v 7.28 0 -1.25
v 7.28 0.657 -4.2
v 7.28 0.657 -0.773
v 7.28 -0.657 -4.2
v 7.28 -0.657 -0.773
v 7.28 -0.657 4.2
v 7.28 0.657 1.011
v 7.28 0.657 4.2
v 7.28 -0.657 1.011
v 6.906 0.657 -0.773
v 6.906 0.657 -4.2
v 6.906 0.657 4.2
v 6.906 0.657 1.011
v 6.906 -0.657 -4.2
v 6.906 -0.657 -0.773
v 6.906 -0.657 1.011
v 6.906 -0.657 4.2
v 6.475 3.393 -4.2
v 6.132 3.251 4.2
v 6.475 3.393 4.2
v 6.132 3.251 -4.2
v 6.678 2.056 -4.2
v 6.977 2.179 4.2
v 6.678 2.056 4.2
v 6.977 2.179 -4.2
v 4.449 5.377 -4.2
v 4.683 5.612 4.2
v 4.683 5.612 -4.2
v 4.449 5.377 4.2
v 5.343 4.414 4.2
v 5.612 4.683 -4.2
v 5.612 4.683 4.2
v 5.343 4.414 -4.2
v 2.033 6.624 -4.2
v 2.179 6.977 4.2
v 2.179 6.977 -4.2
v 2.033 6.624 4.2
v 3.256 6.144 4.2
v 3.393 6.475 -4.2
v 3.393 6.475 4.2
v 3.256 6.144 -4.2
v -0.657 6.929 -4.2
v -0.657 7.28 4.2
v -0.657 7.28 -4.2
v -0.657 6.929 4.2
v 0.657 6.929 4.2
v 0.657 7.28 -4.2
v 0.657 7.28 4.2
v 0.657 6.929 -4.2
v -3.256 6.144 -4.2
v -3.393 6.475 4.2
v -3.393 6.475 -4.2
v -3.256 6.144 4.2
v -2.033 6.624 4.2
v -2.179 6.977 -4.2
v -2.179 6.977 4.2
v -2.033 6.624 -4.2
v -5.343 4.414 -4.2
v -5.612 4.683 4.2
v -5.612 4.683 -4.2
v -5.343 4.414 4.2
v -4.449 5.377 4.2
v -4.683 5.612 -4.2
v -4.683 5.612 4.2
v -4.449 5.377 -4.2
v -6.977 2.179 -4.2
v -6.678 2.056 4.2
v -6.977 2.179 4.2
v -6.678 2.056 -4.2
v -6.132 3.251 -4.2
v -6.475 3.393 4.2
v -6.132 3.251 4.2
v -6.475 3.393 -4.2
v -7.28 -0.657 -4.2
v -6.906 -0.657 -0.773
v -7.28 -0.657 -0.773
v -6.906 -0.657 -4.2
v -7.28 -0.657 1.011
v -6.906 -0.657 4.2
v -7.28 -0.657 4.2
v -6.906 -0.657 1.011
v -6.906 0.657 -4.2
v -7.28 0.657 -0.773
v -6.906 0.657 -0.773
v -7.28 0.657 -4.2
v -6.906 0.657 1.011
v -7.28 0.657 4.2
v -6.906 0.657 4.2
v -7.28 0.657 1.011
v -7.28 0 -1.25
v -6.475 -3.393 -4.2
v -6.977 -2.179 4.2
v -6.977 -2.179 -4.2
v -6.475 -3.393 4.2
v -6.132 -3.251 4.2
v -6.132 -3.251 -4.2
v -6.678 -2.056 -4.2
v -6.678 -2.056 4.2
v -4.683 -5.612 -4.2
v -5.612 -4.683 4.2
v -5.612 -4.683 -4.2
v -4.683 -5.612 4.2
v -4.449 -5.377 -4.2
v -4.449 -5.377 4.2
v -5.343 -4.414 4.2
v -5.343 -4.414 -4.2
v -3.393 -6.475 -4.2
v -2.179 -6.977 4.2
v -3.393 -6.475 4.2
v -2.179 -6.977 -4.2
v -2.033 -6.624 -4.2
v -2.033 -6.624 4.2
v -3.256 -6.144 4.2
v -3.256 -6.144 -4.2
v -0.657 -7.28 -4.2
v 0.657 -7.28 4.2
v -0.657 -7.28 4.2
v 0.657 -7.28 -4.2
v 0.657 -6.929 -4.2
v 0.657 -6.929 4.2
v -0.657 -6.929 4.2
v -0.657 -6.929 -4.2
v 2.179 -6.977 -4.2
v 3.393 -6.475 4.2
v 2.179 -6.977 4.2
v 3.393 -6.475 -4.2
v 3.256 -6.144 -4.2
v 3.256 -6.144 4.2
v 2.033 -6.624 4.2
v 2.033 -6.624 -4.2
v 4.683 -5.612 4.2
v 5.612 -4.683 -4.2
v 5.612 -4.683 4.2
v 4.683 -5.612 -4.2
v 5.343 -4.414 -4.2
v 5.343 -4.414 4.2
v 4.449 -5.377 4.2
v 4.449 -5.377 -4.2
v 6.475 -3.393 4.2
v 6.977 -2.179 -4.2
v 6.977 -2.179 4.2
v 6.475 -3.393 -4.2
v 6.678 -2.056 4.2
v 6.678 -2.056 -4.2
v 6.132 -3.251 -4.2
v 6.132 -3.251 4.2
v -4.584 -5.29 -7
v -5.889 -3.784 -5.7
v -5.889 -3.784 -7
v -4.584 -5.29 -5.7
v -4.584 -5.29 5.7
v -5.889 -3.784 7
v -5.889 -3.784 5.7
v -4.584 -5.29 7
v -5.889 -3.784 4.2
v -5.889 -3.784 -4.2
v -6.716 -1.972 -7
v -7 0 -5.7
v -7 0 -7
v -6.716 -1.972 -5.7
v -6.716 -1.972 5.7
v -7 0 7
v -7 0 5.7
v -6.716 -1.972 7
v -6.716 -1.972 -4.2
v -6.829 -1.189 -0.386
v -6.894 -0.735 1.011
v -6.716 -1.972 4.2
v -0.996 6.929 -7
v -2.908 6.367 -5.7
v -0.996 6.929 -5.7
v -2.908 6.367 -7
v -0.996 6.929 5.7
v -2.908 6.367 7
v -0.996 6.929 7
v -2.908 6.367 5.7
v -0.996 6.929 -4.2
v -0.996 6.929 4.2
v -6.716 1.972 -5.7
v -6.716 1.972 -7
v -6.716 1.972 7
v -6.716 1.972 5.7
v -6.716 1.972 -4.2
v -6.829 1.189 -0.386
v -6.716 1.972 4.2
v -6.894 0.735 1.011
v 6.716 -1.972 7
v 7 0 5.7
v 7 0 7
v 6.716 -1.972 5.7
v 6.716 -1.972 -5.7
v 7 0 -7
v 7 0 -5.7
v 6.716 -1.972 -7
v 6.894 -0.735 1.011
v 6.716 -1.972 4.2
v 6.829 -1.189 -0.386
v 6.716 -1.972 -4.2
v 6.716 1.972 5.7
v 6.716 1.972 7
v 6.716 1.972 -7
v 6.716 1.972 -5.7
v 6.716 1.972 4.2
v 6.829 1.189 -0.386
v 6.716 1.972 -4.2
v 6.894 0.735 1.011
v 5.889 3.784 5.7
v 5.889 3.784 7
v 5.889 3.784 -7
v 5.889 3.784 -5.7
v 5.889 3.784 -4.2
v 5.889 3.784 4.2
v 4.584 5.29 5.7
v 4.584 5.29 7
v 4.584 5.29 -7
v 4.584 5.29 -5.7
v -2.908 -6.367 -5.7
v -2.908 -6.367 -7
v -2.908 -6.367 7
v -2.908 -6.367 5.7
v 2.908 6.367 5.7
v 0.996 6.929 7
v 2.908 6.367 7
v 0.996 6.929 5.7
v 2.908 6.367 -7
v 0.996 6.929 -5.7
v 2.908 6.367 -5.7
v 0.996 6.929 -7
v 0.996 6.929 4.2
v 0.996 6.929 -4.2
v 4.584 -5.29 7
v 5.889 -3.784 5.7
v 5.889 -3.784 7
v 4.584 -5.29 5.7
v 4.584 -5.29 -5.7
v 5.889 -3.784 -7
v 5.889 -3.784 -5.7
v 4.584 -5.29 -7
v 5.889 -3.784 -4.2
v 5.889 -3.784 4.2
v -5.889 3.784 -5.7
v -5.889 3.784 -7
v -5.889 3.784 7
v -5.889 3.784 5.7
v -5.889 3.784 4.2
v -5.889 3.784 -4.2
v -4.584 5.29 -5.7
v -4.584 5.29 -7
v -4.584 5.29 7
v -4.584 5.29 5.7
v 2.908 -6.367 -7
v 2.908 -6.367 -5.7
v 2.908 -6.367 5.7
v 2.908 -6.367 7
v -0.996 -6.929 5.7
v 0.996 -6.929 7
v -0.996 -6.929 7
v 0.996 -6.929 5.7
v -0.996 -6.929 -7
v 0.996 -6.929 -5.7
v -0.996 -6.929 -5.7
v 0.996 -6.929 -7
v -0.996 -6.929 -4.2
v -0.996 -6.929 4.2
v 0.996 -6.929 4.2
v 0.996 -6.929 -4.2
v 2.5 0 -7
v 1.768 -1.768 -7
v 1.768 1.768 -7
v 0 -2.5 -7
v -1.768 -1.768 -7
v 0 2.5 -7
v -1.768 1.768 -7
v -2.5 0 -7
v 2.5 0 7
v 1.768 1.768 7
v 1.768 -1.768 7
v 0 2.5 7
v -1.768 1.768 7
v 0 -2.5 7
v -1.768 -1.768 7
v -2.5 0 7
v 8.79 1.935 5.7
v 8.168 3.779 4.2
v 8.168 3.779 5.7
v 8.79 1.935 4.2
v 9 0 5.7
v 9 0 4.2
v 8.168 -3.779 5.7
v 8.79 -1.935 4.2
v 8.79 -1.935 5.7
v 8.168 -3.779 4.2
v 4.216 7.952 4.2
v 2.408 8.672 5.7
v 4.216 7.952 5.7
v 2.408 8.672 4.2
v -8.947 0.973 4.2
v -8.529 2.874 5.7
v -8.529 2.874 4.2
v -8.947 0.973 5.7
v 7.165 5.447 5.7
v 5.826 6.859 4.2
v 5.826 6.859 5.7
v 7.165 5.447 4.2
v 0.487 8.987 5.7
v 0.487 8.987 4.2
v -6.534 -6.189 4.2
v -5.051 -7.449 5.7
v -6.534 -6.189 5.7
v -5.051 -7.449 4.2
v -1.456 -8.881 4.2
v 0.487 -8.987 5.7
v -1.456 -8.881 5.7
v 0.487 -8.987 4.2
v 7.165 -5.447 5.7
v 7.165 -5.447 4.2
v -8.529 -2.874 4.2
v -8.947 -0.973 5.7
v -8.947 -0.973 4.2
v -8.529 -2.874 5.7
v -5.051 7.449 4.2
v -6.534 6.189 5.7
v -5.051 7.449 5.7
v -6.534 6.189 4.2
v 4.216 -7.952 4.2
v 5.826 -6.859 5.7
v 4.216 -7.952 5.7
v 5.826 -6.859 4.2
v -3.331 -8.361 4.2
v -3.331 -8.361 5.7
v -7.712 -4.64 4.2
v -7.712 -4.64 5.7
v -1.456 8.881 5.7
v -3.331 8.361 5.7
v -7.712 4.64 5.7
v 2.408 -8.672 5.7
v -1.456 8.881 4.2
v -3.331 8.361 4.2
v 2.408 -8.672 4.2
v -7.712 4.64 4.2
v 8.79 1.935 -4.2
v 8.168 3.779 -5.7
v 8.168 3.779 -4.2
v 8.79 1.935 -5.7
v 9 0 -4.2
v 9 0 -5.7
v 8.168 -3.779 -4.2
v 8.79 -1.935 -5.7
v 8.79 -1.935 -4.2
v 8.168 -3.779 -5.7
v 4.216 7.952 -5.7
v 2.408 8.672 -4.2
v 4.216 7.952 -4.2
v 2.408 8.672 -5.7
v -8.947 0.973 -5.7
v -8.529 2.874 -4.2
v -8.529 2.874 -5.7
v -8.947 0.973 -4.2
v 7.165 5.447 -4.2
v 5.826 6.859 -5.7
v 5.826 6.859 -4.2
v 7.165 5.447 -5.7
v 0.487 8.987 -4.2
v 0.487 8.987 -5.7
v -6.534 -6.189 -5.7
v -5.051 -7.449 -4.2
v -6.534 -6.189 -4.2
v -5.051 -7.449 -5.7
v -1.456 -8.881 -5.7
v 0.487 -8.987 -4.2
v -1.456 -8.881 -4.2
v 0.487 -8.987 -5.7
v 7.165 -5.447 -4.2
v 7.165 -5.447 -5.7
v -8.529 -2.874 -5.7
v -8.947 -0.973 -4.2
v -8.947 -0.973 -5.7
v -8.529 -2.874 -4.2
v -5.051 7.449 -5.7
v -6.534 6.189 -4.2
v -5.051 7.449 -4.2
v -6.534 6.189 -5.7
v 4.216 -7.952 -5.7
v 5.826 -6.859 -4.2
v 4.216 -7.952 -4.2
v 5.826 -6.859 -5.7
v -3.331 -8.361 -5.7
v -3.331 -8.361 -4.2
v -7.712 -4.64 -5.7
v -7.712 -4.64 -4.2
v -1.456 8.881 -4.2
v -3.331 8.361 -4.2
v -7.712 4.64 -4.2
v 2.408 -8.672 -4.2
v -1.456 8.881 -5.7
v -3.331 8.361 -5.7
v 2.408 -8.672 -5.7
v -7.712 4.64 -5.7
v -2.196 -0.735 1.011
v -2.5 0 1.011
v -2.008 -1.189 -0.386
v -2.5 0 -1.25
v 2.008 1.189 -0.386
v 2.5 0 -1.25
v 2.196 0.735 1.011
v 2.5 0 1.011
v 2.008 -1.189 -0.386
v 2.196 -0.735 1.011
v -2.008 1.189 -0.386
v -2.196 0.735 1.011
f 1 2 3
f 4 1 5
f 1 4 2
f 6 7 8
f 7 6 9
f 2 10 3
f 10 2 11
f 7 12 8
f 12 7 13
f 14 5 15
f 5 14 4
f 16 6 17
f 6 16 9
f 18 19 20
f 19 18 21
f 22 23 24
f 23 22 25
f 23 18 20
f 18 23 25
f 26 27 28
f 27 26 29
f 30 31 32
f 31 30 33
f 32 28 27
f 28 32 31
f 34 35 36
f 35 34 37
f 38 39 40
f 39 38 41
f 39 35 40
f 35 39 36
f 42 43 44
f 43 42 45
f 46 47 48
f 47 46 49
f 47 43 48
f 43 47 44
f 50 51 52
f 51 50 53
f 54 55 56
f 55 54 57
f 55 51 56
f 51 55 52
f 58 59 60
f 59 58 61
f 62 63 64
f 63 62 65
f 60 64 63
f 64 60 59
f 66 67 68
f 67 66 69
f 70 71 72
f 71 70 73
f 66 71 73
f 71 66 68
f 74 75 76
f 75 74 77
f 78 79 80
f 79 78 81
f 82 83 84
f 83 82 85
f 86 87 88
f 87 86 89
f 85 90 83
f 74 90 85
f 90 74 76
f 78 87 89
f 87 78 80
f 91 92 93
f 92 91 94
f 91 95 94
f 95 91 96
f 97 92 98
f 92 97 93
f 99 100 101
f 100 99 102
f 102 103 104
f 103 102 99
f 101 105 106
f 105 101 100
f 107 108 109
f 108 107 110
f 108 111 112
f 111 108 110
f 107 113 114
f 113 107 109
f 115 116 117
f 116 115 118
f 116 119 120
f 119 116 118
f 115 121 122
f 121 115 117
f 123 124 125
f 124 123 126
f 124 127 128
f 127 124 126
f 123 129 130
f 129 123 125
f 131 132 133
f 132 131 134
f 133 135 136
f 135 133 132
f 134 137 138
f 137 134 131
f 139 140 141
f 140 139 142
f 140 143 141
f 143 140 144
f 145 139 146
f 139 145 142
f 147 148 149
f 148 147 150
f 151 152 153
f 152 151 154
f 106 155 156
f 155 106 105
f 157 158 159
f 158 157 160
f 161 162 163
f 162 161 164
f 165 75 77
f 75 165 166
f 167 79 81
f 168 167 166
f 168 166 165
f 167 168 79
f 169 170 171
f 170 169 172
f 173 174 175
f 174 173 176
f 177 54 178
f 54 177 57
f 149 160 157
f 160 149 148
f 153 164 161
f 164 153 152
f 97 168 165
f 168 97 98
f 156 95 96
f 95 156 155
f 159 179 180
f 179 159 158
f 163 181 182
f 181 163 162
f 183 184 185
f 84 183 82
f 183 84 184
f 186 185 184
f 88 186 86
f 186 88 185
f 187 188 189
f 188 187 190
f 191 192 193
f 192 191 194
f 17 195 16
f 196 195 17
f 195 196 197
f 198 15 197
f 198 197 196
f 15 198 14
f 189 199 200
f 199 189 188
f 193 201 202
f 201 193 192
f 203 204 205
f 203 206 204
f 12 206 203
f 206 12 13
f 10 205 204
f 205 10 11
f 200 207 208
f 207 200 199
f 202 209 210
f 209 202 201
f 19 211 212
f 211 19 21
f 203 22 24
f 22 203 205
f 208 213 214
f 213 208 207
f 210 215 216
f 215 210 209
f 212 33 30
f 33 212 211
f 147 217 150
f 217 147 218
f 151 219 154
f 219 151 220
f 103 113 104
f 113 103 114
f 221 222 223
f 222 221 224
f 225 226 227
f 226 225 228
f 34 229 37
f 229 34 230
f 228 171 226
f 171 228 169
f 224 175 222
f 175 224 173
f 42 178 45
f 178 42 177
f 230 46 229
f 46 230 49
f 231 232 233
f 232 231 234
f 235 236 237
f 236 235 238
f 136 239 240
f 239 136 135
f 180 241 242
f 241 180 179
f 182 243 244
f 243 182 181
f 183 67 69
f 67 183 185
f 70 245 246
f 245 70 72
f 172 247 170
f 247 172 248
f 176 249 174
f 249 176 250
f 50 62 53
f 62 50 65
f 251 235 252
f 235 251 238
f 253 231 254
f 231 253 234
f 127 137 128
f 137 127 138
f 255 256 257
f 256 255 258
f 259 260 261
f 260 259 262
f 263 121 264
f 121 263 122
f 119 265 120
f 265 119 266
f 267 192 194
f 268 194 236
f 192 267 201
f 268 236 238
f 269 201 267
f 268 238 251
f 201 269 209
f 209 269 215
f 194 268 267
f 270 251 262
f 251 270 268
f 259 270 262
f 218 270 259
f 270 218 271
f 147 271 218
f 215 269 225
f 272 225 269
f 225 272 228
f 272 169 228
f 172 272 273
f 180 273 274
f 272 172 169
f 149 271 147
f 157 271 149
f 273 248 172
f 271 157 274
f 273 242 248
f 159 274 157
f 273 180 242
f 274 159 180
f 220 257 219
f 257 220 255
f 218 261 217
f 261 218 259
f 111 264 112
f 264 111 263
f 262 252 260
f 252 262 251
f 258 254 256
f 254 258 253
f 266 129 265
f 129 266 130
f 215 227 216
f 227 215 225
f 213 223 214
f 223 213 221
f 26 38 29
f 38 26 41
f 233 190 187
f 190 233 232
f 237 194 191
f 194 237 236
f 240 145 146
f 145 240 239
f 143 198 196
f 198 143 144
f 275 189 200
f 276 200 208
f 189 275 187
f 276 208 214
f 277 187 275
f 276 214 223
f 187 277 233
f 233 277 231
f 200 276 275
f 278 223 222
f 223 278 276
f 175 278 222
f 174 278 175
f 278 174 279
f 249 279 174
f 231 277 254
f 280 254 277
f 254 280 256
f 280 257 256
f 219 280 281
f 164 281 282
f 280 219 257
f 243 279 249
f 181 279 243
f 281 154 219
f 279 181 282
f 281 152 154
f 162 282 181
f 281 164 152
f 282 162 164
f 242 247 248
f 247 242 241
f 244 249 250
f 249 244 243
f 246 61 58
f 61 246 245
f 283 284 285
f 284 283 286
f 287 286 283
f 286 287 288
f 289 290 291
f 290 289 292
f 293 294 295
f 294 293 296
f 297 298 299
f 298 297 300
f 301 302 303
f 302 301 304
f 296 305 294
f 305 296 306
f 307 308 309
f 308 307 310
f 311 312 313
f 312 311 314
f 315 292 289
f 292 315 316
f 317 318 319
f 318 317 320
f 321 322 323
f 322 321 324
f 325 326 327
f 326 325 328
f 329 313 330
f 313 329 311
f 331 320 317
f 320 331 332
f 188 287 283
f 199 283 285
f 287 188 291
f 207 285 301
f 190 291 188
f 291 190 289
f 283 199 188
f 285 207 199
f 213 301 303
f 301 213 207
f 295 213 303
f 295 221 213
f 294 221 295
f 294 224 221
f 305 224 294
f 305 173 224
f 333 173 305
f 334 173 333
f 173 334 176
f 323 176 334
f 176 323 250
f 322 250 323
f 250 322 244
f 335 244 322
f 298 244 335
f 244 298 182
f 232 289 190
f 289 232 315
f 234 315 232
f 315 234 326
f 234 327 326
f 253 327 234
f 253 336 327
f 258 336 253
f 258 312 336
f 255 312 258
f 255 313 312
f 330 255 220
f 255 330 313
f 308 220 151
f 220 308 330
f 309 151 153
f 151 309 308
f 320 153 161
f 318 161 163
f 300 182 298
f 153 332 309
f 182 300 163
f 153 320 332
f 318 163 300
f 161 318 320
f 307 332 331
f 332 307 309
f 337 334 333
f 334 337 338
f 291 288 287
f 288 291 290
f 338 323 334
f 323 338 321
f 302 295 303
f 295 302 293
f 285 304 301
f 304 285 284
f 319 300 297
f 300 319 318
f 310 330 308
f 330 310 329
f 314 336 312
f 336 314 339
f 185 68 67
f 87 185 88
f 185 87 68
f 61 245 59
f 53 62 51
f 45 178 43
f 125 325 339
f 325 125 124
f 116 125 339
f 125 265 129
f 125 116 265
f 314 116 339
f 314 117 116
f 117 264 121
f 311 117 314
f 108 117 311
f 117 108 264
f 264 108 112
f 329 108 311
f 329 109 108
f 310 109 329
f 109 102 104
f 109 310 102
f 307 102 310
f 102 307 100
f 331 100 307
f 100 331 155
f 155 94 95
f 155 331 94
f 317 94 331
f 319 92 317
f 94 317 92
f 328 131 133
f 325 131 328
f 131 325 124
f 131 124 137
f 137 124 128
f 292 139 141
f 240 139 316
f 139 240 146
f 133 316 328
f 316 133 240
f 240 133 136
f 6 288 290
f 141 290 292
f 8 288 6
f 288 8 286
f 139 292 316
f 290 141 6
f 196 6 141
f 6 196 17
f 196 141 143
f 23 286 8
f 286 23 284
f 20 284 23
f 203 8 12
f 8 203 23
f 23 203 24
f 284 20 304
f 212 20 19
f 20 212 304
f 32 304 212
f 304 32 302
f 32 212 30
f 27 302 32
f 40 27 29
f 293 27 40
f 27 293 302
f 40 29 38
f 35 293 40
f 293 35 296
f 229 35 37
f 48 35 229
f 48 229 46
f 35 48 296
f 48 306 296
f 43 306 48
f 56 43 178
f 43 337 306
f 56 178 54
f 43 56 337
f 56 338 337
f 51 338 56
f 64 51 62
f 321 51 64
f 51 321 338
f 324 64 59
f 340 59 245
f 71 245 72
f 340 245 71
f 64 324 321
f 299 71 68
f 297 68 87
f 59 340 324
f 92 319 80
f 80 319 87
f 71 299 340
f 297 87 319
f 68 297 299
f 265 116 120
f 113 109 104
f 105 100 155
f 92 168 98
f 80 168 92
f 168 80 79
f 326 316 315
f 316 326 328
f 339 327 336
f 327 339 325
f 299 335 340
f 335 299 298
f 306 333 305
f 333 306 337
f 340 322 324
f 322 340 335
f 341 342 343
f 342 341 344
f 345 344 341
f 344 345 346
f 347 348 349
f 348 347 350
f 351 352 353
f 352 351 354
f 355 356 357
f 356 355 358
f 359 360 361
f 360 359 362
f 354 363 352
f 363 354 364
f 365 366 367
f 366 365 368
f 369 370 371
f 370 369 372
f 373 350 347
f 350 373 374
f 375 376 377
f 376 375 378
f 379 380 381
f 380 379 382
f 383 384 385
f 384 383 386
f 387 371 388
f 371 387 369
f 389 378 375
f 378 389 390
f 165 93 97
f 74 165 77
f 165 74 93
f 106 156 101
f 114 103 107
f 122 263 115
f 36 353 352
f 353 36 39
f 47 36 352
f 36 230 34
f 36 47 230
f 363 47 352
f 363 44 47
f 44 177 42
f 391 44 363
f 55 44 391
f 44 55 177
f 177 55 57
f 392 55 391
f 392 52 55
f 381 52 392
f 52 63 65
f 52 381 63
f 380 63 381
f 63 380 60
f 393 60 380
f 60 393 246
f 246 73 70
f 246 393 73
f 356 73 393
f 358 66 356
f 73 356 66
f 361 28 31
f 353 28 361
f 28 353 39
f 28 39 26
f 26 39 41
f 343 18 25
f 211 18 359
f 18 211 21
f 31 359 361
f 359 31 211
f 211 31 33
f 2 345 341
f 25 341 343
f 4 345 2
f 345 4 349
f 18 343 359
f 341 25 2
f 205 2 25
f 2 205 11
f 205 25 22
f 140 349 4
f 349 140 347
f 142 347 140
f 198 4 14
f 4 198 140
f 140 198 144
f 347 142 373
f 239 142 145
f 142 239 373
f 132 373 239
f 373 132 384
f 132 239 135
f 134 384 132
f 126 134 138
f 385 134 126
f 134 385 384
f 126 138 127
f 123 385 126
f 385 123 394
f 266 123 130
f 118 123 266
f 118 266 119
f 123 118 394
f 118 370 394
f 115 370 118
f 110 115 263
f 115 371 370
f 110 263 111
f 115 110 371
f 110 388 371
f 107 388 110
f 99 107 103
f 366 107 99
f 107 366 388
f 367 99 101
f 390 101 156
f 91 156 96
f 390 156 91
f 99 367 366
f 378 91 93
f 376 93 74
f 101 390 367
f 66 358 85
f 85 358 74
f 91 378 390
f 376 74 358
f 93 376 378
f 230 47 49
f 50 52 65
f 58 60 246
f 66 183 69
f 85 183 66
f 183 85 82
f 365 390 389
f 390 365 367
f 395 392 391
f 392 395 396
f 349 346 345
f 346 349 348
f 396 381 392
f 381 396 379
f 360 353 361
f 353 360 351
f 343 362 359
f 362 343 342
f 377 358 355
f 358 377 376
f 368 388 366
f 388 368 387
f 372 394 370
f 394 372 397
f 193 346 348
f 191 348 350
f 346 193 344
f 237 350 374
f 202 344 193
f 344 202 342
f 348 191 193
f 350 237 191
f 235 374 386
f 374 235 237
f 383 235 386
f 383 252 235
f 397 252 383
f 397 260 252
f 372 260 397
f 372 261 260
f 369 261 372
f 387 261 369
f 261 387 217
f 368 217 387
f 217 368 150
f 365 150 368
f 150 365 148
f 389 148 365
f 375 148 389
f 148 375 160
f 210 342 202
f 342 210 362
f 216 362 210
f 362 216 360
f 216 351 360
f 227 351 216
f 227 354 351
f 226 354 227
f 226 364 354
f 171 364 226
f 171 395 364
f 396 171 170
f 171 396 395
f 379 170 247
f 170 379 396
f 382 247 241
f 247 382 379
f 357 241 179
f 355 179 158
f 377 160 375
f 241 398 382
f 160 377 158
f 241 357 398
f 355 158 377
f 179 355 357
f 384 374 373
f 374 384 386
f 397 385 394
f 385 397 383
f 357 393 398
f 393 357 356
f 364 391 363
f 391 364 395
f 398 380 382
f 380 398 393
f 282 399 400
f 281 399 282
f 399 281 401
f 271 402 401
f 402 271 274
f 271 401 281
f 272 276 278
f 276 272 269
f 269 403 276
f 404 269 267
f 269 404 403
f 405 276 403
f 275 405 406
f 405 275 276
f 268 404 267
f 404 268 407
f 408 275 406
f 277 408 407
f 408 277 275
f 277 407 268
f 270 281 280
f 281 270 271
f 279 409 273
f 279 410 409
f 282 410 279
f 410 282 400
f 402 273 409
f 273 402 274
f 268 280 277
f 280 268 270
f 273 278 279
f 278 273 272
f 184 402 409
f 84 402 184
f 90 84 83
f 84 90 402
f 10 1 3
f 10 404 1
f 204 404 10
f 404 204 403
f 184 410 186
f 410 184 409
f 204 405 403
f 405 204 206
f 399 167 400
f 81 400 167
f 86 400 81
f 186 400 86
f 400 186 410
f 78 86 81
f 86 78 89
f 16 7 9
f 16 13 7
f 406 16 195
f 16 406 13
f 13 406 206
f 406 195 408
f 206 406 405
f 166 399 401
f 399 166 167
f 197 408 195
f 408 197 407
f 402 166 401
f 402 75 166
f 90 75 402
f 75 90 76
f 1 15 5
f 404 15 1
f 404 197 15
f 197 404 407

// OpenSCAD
// Parameters
tooth_count = 16; //[8:64:1]
pitch_diameter_mm = 12.16; //[6.08:24.32:0.01]
pulley_width_mm = 10; //[5:30:1]
tooth_radial_height_mm = 1.2; //[0.6:2.4:0.1]
tooth_tangential_width_factor = 0.55; //[0.35:0.8:0.01]
core_radial_thickness_mm = 1.6; //[0.8:3.2:0.1]
bore_diameter_mm = 5; //[2:10:0.1]
hub_diameter_mm = 14; //[7:28:0.1]
hub_length_mm = 14; //[7:28:1]
flange_enabled = 1; //[0:1:1]
flange_diameter_mm = 18; //[9:36:0.1]
flange_thickness_mm = 1.5; //[0.8:3:0.1]
set_screw_count = 1; //[0:2:1]
set_screw_hole_diameter_mm = 2.5; //[1.5:5:0.1]
set_screw_z_offset_mm = 0; //[-10:10:0.5]
overlap_mm = 0.8; //[0.3:2:0.1]

// Derived parameters
pitch_radius = pitch_diameter_mm / 2;
core_radius = pitch_radius - core_radial_thickness_mm;
tooth_pitch_mm = pitch_diameter_mm * PI / tooth_count;
tooth_width = tooth_pitch_mm * tooth_tangential_width_factor;

// Pulley Core Body
module pulley_core_body() {
  color("Silver") {
    cylinder(r=core_radius, h=pulley_width_mm, center=true);
  }
}

// Hub
module hub() {
  color("Silver") {
    cylinder(r=hub_diameter_mm/2, h=hub_length_mm, center=true);
  }
}

// Flanges
module flange_top() {
  color("Silver") {
    cylinder(r=flange_diameter_mm/2, h=flange_thickness_mm*flange_enabled, center=true);
  }
}

module flange_bottom() {
  color("Silver") {
    cylinder(r=flange_diameter_mm/2, h=flange_thickness_mm*flange_enabled, center=true);
  }
}

// Center Bore
module center_bore() {
  cylinder(r=bore_diameter_mm/2, h=hub_length_mm + 2*flange_thickness_mm + 2*overlap_mm, center=true);
}

// Teeth
module tooth() {
  translate([pitch_radius + (tooth_radial_height_mm + overlap_mm)/2 - overlap_mm, 0, 0])
    cube([tooth_radial_height_mm + overlap_mm, tooth_width, pulley_width_mm], center=true);
}

module printed_pulley_teeth() {
  for (i = [0:tooth_count-1]) {
    rotate([0, 0, i*360/tooth_count]) tooth();
  }
}

// Set Screw Holes
module set_screw_hole_0() {
  rotate([0, 90, 0])
    cylinder(r=set_screw_hole_diameter_mm/2, h=hub_diameter_mm + 2*tooth_radial_height_mm + 2*overlap_mm, center=true);
}

module set_screw_hole_1() {
  rotate([0, 90, 90])
    cylinder(r=set_screw_hole_diameter_mm/2, h=hub_diameter_mm + 2*tooth_radial_height_mm + 2*overlap_mm, center=true);
}

// Assembly
module pulley() {
  difference() {
    union() {
      pulley_core_body();
      printed_pulley_teeth();
      hub();
      translate([0, 0, pulley_width_mm/2 + (flange_thickness_mm*flange_enabled)/2 - overlap_mm]) flange_top();
      translate([0, 0, -pulley_width_mm/2 - (flange_thickness_mm*flange_enabled)/2 + overlap_mm]) flange_bottom();
    }
    center_bore();
    if (set_screw_count > 0) {
      set_screw_hole_0();
    }
    if (set_screw_count > 1) {
      set_screw_hole_1();
    }
  }
}

module assembly() {
  pulley();
}

assembly();
